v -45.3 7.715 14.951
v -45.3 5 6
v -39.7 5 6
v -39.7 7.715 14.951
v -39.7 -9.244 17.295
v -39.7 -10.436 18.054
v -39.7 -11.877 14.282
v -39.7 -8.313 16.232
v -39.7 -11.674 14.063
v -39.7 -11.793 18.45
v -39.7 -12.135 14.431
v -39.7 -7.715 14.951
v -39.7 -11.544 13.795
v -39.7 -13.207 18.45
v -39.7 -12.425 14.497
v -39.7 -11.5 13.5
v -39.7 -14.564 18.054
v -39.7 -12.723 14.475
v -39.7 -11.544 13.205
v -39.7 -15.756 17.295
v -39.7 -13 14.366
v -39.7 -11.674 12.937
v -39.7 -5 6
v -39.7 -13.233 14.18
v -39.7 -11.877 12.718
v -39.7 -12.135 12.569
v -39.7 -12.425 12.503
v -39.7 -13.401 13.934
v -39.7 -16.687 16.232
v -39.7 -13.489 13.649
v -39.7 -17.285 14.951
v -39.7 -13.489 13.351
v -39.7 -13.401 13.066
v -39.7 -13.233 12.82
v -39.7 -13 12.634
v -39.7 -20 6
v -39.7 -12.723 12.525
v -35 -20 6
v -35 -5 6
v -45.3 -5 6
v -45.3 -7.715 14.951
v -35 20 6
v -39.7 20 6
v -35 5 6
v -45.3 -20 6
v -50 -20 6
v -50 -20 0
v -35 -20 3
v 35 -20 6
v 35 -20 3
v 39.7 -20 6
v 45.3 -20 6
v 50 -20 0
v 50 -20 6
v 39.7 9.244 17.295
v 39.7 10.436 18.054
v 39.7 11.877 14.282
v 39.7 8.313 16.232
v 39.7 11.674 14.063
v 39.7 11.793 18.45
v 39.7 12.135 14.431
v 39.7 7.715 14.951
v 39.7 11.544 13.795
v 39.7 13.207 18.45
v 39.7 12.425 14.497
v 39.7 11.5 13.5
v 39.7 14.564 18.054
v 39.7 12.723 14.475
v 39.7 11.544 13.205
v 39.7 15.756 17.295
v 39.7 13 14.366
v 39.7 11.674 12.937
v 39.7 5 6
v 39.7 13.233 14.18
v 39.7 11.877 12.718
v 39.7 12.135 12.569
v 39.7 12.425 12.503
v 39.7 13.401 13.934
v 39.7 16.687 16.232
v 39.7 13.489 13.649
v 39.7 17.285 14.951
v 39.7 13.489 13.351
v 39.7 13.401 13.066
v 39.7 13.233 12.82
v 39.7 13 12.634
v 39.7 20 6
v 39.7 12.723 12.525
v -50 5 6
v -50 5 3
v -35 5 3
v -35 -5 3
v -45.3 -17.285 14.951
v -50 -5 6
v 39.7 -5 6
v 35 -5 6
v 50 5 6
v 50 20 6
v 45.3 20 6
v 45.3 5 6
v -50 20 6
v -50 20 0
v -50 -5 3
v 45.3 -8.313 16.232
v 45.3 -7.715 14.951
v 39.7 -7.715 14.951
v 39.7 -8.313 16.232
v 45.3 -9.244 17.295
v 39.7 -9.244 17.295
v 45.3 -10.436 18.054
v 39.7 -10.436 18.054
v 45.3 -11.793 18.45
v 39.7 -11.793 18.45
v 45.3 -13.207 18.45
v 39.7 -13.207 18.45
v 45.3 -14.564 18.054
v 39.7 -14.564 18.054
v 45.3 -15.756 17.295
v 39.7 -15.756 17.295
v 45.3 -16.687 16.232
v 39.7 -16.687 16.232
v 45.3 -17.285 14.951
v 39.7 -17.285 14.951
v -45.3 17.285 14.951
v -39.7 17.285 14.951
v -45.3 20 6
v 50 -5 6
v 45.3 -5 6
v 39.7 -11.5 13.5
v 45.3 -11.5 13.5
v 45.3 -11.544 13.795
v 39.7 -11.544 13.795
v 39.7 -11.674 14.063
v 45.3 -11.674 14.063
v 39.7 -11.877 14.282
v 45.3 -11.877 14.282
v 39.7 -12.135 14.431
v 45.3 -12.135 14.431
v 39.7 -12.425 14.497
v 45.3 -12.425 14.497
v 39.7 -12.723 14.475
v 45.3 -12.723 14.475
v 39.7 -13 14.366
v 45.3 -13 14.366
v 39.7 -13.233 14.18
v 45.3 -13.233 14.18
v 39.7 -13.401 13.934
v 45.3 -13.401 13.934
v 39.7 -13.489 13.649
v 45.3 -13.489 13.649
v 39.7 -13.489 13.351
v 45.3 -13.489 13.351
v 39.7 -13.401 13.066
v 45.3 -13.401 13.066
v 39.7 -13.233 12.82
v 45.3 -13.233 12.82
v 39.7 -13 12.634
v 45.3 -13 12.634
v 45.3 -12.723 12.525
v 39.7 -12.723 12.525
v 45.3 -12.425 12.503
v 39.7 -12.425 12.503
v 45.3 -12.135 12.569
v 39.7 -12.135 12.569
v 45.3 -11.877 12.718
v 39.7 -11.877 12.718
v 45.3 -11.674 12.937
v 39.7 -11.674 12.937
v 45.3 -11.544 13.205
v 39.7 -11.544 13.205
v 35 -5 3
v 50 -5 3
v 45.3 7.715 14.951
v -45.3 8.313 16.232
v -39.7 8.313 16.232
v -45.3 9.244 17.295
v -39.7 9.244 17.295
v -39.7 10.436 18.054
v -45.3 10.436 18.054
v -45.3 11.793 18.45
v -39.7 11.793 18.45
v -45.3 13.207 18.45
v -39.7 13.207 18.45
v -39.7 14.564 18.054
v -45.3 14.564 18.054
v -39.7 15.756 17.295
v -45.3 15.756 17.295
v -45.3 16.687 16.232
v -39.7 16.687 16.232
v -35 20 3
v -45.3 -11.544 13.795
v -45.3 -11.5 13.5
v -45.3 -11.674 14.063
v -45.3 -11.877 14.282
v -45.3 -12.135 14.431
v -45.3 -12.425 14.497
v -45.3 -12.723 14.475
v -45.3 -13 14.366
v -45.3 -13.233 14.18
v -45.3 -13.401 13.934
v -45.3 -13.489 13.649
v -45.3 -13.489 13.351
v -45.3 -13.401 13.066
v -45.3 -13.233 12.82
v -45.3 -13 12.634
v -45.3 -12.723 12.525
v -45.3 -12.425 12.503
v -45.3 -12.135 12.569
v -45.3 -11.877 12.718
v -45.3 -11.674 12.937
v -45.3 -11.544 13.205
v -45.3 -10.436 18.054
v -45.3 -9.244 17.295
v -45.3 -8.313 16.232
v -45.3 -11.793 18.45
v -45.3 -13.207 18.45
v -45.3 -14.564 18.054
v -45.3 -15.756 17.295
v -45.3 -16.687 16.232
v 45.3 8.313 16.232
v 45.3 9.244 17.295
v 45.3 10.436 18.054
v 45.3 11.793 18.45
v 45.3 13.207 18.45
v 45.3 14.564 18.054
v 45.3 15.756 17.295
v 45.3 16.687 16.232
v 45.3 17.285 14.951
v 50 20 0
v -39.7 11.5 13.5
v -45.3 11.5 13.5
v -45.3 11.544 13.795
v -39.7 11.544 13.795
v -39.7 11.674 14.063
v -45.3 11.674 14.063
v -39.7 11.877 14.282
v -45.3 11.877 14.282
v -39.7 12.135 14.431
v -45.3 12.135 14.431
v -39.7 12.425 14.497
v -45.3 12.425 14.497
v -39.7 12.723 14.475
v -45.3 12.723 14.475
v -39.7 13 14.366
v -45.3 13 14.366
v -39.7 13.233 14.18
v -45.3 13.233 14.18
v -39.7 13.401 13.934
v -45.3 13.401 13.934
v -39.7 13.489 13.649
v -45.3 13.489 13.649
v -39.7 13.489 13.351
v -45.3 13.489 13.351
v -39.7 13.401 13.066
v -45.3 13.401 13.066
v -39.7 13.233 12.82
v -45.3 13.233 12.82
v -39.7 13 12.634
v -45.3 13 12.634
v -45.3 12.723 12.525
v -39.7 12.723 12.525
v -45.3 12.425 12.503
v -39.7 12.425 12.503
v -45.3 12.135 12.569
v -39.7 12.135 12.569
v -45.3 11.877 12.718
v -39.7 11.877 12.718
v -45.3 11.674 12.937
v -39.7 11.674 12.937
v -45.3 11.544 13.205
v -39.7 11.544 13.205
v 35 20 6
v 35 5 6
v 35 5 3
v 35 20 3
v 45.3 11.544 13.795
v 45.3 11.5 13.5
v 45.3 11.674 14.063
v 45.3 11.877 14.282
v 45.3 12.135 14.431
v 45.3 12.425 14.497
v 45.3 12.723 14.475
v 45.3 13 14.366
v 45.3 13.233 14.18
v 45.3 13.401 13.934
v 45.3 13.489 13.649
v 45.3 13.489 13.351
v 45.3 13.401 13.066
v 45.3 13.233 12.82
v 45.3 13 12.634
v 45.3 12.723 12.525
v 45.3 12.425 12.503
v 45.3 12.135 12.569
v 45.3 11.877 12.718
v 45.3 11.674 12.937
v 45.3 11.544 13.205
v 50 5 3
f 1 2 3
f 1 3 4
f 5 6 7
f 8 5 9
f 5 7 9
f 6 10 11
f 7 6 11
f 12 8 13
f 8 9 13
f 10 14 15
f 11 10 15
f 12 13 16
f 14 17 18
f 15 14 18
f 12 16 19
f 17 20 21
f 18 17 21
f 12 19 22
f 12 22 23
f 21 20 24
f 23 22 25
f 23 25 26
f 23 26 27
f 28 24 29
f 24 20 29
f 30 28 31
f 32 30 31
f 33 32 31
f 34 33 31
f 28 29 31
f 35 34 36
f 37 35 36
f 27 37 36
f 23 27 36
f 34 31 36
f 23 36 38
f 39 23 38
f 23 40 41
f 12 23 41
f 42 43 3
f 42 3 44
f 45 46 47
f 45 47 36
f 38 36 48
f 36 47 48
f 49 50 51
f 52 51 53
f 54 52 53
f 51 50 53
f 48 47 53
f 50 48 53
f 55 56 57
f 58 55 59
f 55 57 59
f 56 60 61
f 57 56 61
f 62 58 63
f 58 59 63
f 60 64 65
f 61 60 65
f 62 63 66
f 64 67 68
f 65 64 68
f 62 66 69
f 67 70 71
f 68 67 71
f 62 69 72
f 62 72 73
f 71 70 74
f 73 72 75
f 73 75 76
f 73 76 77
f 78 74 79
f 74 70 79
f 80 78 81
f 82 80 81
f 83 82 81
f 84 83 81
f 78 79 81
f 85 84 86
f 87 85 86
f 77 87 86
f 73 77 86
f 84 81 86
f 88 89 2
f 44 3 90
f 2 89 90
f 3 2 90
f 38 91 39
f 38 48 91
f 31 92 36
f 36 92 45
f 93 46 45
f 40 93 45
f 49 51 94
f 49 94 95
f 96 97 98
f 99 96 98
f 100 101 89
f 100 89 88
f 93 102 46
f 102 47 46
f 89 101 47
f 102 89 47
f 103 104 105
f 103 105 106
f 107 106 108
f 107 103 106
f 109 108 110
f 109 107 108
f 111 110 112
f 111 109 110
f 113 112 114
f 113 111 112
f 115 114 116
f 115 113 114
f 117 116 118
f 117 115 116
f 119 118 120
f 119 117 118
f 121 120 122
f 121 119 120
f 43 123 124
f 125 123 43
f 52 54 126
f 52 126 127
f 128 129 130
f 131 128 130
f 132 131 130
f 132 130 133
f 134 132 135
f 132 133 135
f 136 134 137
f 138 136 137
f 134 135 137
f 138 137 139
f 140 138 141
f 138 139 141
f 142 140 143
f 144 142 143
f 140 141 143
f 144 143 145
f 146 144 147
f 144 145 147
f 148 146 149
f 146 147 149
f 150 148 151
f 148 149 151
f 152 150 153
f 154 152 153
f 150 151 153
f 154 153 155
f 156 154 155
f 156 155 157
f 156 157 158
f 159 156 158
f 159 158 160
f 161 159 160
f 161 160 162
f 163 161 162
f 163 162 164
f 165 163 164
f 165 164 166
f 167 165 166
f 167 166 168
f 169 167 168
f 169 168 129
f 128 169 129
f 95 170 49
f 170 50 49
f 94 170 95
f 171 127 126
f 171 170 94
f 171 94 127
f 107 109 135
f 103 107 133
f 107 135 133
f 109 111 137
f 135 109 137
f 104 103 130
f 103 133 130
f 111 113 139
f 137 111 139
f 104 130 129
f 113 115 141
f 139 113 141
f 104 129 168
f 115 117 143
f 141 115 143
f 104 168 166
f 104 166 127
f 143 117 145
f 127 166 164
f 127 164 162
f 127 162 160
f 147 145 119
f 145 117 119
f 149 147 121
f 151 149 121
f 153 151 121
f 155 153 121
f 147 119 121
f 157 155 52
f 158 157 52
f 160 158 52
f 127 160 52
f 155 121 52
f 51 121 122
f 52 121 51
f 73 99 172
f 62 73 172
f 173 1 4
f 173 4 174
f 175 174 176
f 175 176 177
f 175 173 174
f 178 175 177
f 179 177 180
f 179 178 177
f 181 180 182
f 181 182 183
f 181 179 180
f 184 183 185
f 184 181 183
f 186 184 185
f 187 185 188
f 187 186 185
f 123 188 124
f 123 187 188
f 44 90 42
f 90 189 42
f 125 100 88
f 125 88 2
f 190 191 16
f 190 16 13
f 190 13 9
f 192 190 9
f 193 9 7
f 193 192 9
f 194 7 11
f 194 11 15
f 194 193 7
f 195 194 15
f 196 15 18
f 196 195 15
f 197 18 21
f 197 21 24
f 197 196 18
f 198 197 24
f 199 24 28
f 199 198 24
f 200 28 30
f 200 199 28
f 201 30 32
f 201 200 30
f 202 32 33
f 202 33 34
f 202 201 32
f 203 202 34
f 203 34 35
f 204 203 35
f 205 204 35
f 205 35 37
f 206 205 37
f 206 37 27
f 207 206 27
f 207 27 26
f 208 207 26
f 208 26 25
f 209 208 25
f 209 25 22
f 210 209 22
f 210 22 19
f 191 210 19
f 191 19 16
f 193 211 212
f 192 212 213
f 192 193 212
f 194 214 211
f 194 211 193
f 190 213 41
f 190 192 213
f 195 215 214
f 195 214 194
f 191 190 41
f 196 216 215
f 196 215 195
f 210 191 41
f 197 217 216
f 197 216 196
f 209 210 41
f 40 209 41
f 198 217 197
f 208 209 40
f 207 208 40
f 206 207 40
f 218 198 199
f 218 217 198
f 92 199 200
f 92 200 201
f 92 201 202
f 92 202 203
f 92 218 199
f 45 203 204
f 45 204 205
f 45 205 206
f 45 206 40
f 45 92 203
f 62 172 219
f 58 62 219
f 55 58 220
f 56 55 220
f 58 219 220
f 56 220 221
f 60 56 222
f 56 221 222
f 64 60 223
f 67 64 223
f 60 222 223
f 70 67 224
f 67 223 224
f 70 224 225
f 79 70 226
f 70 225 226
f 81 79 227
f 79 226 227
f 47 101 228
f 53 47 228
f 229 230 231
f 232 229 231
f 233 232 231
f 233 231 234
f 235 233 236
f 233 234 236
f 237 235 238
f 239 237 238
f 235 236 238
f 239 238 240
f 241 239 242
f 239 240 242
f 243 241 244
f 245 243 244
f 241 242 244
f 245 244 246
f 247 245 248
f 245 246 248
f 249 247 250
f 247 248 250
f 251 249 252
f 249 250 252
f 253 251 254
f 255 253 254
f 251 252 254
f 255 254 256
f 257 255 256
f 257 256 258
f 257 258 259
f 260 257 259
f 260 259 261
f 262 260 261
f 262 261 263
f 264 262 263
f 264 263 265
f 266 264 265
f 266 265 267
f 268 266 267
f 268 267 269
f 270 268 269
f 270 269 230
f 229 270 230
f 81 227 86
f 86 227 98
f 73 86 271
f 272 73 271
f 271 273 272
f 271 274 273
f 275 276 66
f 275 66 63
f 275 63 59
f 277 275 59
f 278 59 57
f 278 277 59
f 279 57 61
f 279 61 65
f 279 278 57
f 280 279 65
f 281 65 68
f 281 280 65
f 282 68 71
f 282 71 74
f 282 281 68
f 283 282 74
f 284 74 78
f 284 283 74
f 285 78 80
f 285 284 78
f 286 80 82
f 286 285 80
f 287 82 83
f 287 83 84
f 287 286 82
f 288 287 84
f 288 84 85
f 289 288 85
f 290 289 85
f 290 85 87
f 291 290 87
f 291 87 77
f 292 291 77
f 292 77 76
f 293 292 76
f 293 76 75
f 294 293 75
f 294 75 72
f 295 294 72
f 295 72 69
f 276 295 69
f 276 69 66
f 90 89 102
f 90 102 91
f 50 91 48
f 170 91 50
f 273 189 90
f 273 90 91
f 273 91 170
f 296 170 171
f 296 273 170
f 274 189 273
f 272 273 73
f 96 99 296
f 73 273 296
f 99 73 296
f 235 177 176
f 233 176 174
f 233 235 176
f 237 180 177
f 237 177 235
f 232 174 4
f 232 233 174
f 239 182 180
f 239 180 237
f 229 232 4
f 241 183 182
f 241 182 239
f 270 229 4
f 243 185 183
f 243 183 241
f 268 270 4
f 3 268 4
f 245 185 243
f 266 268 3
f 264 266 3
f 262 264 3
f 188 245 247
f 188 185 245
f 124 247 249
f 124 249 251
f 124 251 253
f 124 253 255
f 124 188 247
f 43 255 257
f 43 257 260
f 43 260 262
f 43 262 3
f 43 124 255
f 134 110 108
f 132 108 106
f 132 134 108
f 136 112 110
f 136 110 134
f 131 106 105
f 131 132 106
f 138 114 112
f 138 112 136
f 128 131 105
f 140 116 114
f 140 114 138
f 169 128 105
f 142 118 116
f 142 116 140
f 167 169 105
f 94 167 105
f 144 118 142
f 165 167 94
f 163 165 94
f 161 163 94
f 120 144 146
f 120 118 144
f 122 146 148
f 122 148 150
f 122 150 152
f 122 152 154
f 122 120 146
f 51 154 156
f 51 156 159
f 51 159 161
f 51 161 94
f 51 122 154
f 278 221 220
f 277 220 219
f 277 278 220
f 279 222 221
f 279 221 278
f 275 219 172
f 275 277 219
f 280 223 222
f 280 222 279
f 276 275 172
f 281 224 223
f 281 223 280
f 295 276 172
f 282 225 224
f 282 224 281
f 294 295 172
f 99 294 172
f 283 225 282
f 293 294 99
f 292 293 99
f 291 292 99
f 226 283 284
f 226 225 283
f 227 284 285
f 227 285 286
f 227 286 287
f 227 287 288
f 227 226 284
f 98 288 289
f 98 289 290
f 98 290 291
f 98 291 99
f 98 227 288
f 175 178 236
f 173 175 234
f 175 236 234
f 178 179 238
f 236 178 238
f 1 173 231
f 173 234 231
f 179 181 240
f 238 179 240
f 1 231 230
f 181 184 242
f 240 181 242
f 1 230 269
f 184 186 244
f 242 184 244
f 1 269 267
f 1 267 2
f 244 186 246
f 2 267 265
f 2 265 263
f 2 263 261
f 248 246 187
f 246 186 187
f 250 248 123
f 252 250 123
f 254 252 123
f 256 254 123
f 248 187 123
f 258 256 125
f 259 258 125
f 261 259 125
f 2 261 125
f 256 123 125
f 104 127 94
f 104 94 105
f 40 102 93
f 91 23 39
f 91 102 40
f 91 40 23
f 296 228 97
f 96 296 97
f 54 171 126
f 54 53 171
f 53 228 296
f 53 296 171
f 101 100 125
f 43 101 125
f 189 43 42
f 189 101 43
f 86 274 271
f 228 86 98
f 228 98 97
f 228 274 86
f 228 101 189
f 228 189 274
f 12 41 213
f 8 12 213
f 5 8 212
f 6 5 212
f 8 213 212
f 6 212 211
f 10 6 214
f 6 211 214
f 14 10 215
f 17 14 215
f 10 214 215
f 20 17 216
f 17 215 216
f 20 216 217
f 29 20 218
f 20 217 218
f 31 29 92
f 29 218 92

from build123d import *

# Parameters (mm, degrees)
SKETCH1_W               = 100
SKETCH1_H               = 40
BOSS_EXTRUDE1_DEPTH     = 3
SKETCH2_W               = 15
SKETCH2_H               = 15
BOSS_EXTRUDE2_DEPTH     = 3
SKETCH3_R               = 1
BOSS_EXTRUDE3_DEPTH     = 15
CUT_EXTRUDE1_REACH      = 68.65
SKETCH4_W               = 4.7
SKETCH4_H               = 12.5
MIRROR2_COPY_1_SKETCH_R = 1
MIRROR2_COPY_1_DEPTH    = 15
MIRROR2_COPY_2_REACH    = 68.65
MIRROR2_COPY_2_SKETCH_W = 4.7
MIRROR2_COPY_2_SKETCH_H = 12.5


with BuildPart() as part:
    # Sketch1 → Boss-Extrude1 (new body)
    with BuildSketch(Plane.XY):
        Rectangle(SKETCH1_W, SKETCH1_H)
    extrude(amount=BOSS_EXTRUDE1_DEPTH)

    # Sketch2 → Boss-Extrude2 (add)
    with BuildSketch(Plane.XY.offset(3)):
        with Locations((-42.5, 12.5)):
            Rectangle(SKETCH2_W, SKETCH2_H)
        with Locations((-42.5, -12.5)):
            Rectangle(SKETCH2_W, SKETCH2_H)
        with Locations((42.5, -12.5)):
            Rectangle(SKETCH2_W, SKETCH2_H)
        with Locations((42.5, 12.5)):
            Rectangle(SKETCH2_W, SKETCH2_H)
    extrude(amount=BOSS_EXTRUDE2_DEPTH)

    # Sketch3 → Boss-Extrude3 (add)
    with BuildSketch(Plane.ZY.offset(50)):
        with BuildLine():
            Line((6, 5), (14.951381156, 7.715285511))
            ThreePointArc((14.951381156, 7.715285511), (18.5, 12.5), (14.951381156, 17.284714489))
            Line((14.951381156, 17.284714489), (6, 20))
            Line((6, 20), (6, 5))
        make_face()
        with Locations(Location((13.5, 12.5, 0), (0, 0, 270))):
            Circle(SKETCH3_R, mode=Mode.SUBTRACT)
    boss_extrude3 = extrude(amount=-BOSS_EXTRUDE3_DEPTH)

    # Sketch4 → Cut-Extrude1 (cut, up to next)
    with BuildSketch(Plane(origin=(0, 20, 0), x_dir=(1, 0, 0), z_dir=(0, 1, 0)), mode=Mode.PRIVATE) as cut_extrude1_sk1:
        with Locations((-37.35, -12.25)):
            Rectangle(SKETCH4_W, SKETCH4_H)
    cut_extrude1_tool1 = extrude(cut_extrude1_sk1.sketch, amount=-CUT_EXTRUDE1_REACH, mode=Mode.PRIVATE) & part.part
    # Sketch4 → Cut-Extrude1 (cut, up to next)
    with BuildSketch(Plane(origin=(0, 20, 0), x_dir=(1, 0, 0), z_dir=(0, 1, 0)), mode=Mode.PRIVATE) as cut_extrude1_sk2:
        with Locations((-47.65, -12.25)):
            Rectangle(SKETCH4_W, SKETCH4_H)
    cut_extrude1_tool2 = extrude(cut_extrude1_sk2.sketch, amount=-CUT_EXTRUDE1_REACH, mode=Mode.PRIVATE) & part.part
    cut_extrude1_1 = cut_extrude1_tool1.solids().sort_by_distance((-37.35, 20, 12.25))[0]
    add(cut_extrude1_1, mode=Mode.SUBTRACT)
    cut_extrude1_2 = cut_extrude1_tool2.solids().sort_by_distance((-47.65, 20, 12.25))[0]
    add(cut_extrude1_2, mode=Mode.SUBTRACT)
    cut_extrude1 = cut_extrude1_1 + cut_extrude1_2  # Cut-Extrude1 as one shape, for the pattern or mirror that repeats it

    # Mirror1: Boss-Extrude3, Cut-Extrude1 across plane
    add(boss_extrude3.mirror(Plane.ZX))
    add(cut_extrude1.mirror(Plane.ZX), mode=Mode.SUBTRACT)

    # Mirror2: Boss-Extrude3, Cut-Extrude1 across plane
    add(boss_extrude3.mirror(Plane(origin=(0, 0, 0), x_dir=(0, 0, 1), z_dir=(1, 0, 0))))
    add(cut_extrude1.mirror(Plane(origin=(0, 0, 0), x_dir=(0, 0, 1), z_dir=(1, 0, 0))), mode=Mode.SUBTRACT)

    # Mirror2 copy 1 sketch → Mirror2 copy 1 (add)
    with BuildSketch(Plane(origin=(50, 0, 0), x_dir=(0, 0, 1), z_dir=(1, 0, 0))):
        with BuildLine():
            Line((6, 5), (14.951381156, 7.715285511))
            ThreePointArc((14.951381156, 7.715285511), (18.5, 12.5), (14.951381156, 17.284714489))
            Line((14.951381156, 17.284714489), (6, 20))
            Line((6, 20), (6, 5))
        make_face()
        with Locations(Location((13.5, 12.5, 0), (0, 0, 270))):
            Circle(MIRROR2_COPY_1_SKETCH_R, mode=Mode.SUBTRACT)
    extrude(amount=-MIRROR2_COPY_1_DEPTH)

    # Mirror2 copy 2 sketch → Mirror2 copy 2 (cut, up to next)
    with BuildSketch(Plane(origin=(0, -20, 0), x_dir=(-1, 0, 0), z_dir=(0, -1, 0)), mode=Mode.PRIVATE) as mirror2_copy_2_sk1:
        with Locations((-37.35, -12.25)):
            Rectangle(MIRROR2_COPY_2_SKETCH_W, MIRROR2_COPY_2_SKETCH_H)
    mirror2_copy_2_tool1 = extrude(mirror2_copy_2_sk1.sketch, amount=-MIRROR2_COPY_2_REACH, mode=Mode.PRIVATE) & part.part
    # Mirror2 copy 2 sketch → Mirror2 copy 2 (cut, up to next)
    with BuildSketch(Plane(origin=(0, -20, 0), x_dir=(-1, 0, 0), z_dir=(0, -1, 0)), mode=Mode.PRIVATE) as mirror2_copy_2_sk2:
        with Locations((-47.65, -12.25)):
            Rectangle(MIRROR2_COPY_2_SKETCH_W, MIRROR2_COPY_2_SKETCH_H)
    mirror2_copy_2_tool2 = extrude(mirror2_copy_2_sk2.sketch, amount=-MIRROR2_COPY_2_REACH, mode=Mode.PRIVATE) & part.part
    add(mirror2_copy_2_tool1.solids().sort_by_distance((37.35, -20, 12.25))[0], mode=Mode.SUBTRACT)
    add(mirror2_copy_2_tool2.solids().sort_by_distance((47.65, -20, 12.25))[0], mode=Mode.SUBTRACT)


solid = part.part
